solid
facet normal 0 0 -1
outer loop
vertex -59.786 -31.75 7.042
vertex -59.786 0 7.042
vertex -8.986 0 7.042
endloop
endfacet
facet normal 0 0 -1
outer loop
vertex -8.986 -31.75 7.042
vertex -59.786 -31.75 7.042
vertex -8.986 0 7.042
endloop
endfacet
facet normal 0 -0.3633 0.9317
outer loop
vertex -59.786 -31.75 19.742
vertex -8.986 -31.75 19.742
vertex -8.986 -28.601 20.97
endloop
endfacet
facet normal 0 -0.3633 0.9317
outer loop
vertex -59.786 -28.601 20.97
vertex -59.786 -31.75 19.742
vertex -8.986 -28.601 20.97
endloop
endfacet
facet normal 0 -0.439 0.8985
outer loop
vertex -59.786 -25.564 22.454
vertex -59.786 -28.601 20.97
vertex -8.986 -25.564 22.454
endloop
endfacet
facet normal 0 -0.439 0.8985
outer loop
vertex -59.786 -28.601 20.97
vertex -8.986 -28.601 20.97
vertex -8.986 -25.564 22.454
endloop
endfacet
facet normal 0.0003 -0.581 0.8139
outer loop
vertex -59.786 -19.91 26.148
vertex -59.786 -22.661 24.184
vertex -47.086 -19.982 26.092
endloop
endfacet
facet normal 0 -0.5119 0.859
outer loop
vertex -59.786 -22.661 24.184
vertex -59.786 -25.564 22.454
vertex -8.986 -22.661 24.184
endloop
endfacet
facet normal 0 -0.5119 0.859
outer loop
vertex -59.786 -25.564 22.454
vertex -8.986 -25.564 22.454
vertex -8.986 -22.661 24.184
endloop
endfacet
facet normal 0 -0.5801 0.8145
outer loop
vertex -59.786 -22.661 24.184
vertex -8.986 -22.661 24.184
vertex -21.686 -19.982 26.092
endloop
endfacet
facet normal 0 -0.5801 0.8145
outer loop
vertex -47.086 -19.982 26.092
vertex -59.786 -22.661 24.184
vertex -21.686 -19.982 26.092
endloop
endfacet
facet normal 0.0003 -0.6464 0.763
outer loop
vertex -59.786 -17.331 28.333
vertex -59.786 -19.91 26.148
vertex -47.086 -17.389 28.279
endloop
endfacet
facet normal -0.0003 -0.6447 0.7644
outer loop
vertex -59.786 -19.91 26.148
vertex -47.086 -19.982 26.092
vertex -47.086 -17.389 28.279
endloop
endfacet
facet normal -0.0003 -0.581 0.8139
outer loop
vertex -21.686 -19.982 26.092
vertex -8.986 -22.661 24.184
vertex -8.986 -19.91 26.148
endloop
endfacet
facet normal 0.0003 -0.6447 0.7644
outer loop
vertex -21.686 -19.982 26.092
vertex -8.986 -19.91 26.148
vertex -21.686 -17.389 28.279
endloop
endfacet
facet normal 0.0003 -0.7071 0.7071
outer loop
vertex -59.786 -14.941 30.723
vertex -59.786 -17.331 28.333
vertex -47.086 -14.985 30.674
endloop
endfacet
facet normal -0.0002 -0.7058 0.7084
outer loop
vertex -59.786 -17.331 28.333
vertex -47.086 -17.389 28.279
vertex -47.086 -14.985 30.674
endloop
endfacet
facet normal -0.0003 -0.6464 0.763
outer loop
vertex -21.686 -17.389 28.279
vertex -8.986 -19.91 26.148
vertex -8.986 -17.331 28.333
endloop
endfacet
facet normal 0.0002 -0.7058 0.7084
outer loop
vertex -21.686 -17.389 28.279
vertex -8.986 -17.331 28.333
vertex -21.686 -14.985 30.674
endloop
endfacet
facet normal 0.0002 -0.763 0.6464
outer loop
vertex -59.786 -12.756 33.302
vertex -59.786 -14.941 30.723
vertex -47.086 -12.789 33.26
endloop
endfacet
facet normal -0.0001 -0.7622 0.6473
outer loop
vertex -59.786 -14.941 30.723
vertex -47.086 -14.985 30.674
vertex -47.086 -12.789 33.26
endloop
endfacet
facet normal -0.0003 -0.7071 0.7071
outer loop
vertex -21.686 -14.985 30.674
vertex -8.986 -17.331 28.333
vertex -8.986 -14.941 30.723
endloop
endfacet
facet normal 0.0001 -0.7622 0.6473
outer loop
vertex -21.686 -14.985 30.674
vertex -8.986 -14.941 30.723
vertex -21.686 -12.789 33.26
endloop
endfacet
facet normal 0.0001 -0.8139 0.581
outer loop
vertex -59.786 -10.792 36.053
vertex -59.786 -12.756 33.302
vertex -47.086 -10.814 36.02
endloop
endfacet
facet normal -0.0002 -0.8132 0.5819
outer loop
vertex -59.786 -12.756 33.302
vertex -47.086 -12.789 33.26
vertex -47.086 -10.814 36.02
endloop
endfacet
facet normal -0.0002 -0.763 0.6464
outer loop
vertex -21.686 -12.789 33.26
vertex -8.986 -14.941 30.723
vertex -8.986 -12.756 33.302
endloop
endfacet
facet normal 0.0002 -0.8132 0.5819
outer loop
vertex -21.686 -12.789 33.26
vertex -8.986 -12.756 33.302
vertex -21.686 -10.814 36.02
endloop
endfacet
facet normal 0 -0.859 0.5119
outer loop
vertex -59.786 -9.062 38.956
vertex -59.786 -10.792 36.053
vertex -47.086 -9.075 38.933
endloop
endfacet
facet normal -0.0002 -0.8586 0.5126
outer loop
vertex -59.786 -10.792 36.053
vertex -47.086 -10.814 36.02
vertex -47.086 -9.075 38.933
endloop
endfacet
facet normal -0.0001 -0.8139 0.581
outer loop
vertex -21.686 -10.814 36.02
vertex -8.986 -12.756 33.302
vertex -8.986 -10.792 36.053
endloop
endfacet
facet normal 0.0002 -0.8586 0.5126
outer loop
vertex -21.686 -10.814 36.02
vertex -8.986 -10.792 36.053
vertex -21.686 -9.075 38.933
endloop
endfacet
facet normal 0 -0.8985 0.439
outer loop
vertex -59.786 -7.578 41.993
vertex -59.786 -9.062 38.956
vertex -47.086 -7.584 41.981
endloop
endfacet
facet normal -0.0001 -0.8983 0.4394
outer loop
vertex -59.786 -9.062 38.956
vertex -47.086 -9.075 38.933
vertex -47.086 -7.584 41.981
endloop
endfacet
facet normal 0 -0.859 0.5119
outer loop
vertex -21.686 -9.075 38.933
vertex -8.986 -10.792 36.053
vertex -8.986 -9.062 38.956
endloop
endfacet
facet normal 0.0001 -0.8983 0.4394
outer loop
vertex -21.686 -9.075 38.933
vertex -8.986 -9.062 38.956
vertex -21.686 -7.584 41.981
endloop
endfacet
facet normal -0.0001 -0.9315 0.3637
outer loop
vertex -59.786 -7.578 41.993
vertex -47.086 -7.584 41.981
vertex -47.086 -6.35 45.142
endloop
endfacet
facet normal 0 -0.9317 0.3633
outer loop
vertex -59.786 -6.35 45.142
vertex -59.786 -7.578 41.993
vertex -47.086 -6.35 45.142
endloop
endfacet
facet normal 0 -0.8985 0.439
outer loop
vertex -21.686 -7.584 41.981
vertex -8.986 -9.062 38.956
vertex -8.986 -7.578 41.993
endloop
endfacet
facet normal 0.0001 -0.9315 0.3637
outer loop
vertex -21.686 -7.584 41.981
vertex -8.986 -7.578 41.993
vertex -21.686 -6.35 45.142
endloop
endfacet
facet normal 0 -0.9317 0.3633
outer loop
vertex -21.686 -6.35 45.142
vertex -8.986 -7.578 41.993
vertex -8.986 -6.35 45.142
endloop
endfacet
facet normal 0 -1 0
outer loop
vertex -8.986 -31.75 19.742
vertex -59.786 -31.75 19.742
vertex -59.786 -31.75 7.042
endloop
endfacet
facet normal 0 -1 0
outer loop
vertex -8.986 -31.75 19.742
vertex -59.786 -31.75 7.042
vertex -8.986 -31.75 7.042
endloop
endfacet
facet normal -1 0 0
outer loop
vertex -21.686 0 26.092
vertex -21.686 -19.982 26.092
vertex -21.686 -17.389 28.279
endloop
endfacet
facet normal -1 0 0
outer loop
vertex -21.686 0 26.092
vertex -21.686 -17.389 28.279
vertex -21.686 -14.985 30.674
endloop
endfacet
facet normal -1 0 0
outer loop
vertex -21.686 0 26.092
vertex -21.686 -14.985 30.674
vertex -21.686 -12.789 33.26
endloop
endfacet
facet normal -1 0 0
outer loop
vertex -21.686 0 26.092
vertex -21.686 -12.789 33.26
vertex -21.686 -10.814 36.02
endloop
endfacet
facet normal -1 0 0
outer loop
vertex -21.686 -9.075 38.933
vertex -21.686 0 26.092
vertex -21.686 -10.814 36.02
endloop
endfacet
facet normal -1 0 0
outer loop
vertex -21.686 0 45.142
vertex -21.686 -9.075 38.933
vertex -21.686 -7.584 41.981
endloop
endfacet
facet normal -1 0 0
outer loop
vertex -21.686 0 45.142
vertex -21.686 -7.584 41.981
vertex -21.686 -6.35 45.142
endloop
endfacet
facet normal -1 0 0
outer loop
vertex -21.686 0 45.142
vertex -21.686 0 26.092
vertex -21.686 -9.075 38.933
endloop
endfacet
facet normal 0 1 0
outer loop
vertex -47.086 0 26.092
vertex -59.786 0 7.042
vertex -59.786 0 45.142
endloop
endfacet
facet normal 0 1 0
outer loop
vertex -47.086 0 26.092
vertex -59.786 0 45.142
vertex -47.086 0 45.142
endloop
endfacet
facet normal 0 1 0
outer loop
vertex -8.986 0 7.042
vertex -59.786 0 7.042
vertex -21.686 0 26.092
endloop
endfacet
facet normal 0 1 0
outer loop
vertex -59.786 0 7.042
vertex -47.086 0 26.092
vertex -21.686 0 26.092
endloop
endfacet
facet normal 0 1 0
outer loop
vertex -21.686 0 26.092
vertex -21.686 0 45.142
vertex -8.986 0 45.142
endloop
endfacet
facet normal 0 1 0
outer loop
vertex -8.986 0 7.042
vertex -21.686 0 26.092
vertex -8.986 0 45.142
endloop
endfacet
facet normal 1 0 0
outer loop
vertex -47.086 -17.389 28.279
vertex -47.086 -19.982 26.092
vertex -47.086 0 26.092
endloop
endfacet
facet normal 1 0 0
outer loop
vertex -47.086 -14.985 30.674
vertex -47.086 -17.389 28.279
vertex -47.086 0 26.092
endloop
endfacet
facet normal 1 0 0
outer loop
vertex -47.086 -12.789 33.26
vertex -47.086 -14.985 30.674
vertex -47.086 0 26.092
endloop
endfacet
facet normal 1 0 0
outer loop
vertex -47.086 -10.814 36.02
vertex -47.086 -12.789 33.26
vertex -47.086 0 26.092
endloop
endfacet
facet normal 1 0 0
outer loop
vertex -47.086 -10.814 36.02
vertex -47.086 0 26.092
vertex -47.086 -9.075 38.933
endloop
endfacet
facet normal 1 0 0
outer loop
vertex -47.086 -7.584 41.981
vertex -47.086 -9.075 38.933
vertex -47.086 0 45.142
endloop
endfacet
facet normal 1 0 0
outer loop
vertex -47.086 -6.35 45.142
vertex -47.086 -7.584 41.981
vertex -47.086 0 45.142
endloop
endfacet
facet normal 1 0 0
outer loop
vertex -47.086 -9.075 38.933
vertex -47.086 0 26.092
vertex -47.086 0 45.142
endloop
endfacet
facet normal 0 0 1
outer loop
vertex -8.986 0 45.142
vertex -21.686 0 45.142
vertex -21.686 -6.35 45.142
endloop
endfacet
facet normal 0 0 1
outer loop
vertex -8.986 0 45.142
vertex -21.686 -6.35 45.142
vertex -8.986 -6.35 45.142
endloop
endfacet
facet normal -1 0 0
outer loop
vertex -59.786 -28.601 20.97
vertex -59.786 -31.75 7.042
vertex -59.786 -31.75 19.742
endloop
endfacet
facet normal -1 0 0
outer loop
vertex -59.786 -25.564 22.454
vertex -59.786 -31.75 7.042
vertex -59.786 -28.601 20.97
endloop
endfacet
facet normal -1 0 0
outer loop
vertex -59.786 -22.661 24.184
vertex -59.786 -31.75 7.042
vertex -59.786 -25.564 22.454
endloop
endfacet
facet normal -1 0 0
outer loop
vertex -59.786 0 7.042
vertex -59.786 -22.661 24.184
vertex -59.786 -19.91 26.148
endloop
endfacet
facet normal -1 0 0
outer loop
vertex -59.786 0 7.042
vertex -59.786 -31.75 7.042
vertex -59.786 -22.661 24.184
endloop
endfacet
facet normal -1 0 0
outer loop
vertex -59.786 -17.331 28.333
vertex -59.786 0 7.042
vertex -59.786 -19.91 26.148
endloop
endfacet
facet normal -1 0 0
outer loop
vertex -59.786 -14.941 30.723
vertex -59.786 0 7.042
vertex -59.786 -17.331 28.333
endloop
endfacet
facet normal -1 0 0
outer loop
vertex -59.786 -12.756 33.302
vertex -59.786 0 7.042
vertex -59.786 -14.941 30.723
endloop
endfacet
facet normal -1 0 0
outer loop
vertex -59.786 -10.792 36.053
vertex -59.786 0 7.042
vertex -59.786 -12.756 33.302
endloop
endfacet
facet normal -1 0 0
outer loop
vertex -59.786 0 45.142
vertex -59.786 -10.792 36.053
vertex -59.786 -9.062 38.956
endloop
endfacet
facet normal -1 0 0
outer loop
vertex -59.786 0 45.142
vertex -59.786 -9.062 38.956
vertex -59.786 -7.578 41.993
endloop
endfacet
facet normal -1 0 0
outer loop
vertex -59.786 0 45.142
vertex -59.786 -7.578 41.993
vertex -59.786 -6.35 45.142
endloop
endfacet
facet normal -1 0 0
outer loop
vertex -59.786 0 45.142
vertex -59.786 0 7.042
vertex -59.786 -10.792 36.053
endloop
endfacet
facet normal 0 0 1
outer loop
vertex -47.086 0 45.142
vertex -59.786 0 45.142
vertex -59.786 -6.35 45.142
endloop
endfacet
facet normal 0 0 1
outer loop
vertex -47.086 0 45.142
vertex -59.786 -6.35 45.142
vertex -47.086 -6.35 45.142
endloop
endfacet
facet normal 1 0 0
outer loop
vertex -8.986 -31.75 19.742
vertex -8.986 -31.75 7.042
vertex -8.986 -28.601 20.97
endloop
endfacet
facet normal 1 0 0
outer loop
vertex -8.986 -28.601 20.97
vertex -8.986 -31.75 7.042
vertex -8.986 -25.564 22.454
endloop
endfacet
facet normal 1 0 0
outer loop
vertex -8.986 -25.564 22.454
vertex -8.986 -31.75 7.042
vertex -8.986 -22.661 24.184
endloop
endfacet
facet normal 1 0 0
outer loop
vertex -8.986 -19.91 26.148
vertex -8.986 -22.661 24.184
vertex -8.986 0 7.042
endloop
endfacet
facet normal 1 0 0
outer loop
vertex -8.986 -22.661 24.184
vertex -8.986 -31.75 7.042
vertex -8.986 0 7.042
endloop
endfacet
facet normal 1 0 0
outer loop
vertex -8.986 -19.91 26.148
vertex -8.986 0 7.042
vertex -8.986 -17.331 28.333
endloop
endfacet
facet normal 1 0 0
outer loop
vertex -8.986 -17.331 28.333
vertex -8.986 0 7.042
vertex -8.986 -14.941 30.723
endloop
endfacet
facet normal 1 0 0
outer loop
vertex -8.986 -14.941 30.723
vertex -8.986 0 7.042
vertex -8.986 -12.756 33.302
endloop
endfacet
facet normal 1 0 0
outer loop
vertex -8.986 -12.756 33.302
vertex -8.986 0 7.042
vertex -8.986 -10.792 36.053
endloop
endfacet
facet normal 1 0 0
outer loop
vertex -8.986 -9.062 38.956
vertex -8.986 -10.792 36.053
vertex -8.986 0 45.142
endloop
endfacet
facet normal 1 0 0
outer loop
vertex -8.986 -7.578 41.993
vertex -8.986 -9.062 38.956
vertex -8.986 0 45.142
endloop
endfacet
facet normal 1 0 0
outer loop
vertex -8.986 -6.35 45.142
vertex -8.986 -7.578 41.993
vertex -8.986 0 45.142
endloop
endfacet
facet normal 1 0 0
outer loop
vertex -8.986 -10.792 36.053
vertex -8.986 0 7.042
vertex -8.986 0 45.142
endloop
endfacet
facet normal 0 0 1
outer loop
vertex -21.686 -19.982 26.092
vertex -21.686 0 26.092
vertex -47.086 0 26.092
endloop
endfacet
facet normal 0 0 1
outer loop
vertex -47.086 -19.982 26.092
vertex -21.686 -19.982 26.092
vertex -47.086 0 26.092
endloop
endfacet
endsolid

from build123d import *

# Parameters (mm, degrees)
F0_W     = 50.8
F0_H     = 38.1
F1_DEPTH = 31.75
F3_DEPTH = 50.801
F4_W     = 25.4
F4_H     = 19.05
F5_DEPTH = 31.751


with BuildPart() as f1:
    # F0 (on Front) → F1 (new body)
    with BuildSketch(Plane.XZ):
        with Locations((-34.38605, 26.091824)):
            Rectangle(F0_W, F0_H)
    extrude(amount=F1_DEPTH)

    # F2 (on face) → F3 (cut, through all)
    with BuildSketch(Plane.YZ.offset(-8.98605)):
        with BuildLine():
            Line((-31.75, 45.141824), (-31.75, 19.741824))
            ThreePointArc((-31.75, 19.741824), (-16.111006, 29.50283), (-6.35, 45.141824))
            Line((-6.35, 45.141824), (-31.75, 45.141824))
        make_face()
    extrude(amount=-F3_DEPTH, mode=Mode.SUBTRACT)

    # F4 (on face) → F5 (cut, through all)
    with BuildSketch(Plane(origin=(0, 0, 0), x_dir=(-1, 0, 0), z_dir=(0, 1, 0))):
        with Locations((34.38605, 35.616824)):
            Rectangle(F4_W, F4_H)
    extrude(amount=-F5_DEPTH, mode=Mode.SUBTRACT)


solid = f1.part
